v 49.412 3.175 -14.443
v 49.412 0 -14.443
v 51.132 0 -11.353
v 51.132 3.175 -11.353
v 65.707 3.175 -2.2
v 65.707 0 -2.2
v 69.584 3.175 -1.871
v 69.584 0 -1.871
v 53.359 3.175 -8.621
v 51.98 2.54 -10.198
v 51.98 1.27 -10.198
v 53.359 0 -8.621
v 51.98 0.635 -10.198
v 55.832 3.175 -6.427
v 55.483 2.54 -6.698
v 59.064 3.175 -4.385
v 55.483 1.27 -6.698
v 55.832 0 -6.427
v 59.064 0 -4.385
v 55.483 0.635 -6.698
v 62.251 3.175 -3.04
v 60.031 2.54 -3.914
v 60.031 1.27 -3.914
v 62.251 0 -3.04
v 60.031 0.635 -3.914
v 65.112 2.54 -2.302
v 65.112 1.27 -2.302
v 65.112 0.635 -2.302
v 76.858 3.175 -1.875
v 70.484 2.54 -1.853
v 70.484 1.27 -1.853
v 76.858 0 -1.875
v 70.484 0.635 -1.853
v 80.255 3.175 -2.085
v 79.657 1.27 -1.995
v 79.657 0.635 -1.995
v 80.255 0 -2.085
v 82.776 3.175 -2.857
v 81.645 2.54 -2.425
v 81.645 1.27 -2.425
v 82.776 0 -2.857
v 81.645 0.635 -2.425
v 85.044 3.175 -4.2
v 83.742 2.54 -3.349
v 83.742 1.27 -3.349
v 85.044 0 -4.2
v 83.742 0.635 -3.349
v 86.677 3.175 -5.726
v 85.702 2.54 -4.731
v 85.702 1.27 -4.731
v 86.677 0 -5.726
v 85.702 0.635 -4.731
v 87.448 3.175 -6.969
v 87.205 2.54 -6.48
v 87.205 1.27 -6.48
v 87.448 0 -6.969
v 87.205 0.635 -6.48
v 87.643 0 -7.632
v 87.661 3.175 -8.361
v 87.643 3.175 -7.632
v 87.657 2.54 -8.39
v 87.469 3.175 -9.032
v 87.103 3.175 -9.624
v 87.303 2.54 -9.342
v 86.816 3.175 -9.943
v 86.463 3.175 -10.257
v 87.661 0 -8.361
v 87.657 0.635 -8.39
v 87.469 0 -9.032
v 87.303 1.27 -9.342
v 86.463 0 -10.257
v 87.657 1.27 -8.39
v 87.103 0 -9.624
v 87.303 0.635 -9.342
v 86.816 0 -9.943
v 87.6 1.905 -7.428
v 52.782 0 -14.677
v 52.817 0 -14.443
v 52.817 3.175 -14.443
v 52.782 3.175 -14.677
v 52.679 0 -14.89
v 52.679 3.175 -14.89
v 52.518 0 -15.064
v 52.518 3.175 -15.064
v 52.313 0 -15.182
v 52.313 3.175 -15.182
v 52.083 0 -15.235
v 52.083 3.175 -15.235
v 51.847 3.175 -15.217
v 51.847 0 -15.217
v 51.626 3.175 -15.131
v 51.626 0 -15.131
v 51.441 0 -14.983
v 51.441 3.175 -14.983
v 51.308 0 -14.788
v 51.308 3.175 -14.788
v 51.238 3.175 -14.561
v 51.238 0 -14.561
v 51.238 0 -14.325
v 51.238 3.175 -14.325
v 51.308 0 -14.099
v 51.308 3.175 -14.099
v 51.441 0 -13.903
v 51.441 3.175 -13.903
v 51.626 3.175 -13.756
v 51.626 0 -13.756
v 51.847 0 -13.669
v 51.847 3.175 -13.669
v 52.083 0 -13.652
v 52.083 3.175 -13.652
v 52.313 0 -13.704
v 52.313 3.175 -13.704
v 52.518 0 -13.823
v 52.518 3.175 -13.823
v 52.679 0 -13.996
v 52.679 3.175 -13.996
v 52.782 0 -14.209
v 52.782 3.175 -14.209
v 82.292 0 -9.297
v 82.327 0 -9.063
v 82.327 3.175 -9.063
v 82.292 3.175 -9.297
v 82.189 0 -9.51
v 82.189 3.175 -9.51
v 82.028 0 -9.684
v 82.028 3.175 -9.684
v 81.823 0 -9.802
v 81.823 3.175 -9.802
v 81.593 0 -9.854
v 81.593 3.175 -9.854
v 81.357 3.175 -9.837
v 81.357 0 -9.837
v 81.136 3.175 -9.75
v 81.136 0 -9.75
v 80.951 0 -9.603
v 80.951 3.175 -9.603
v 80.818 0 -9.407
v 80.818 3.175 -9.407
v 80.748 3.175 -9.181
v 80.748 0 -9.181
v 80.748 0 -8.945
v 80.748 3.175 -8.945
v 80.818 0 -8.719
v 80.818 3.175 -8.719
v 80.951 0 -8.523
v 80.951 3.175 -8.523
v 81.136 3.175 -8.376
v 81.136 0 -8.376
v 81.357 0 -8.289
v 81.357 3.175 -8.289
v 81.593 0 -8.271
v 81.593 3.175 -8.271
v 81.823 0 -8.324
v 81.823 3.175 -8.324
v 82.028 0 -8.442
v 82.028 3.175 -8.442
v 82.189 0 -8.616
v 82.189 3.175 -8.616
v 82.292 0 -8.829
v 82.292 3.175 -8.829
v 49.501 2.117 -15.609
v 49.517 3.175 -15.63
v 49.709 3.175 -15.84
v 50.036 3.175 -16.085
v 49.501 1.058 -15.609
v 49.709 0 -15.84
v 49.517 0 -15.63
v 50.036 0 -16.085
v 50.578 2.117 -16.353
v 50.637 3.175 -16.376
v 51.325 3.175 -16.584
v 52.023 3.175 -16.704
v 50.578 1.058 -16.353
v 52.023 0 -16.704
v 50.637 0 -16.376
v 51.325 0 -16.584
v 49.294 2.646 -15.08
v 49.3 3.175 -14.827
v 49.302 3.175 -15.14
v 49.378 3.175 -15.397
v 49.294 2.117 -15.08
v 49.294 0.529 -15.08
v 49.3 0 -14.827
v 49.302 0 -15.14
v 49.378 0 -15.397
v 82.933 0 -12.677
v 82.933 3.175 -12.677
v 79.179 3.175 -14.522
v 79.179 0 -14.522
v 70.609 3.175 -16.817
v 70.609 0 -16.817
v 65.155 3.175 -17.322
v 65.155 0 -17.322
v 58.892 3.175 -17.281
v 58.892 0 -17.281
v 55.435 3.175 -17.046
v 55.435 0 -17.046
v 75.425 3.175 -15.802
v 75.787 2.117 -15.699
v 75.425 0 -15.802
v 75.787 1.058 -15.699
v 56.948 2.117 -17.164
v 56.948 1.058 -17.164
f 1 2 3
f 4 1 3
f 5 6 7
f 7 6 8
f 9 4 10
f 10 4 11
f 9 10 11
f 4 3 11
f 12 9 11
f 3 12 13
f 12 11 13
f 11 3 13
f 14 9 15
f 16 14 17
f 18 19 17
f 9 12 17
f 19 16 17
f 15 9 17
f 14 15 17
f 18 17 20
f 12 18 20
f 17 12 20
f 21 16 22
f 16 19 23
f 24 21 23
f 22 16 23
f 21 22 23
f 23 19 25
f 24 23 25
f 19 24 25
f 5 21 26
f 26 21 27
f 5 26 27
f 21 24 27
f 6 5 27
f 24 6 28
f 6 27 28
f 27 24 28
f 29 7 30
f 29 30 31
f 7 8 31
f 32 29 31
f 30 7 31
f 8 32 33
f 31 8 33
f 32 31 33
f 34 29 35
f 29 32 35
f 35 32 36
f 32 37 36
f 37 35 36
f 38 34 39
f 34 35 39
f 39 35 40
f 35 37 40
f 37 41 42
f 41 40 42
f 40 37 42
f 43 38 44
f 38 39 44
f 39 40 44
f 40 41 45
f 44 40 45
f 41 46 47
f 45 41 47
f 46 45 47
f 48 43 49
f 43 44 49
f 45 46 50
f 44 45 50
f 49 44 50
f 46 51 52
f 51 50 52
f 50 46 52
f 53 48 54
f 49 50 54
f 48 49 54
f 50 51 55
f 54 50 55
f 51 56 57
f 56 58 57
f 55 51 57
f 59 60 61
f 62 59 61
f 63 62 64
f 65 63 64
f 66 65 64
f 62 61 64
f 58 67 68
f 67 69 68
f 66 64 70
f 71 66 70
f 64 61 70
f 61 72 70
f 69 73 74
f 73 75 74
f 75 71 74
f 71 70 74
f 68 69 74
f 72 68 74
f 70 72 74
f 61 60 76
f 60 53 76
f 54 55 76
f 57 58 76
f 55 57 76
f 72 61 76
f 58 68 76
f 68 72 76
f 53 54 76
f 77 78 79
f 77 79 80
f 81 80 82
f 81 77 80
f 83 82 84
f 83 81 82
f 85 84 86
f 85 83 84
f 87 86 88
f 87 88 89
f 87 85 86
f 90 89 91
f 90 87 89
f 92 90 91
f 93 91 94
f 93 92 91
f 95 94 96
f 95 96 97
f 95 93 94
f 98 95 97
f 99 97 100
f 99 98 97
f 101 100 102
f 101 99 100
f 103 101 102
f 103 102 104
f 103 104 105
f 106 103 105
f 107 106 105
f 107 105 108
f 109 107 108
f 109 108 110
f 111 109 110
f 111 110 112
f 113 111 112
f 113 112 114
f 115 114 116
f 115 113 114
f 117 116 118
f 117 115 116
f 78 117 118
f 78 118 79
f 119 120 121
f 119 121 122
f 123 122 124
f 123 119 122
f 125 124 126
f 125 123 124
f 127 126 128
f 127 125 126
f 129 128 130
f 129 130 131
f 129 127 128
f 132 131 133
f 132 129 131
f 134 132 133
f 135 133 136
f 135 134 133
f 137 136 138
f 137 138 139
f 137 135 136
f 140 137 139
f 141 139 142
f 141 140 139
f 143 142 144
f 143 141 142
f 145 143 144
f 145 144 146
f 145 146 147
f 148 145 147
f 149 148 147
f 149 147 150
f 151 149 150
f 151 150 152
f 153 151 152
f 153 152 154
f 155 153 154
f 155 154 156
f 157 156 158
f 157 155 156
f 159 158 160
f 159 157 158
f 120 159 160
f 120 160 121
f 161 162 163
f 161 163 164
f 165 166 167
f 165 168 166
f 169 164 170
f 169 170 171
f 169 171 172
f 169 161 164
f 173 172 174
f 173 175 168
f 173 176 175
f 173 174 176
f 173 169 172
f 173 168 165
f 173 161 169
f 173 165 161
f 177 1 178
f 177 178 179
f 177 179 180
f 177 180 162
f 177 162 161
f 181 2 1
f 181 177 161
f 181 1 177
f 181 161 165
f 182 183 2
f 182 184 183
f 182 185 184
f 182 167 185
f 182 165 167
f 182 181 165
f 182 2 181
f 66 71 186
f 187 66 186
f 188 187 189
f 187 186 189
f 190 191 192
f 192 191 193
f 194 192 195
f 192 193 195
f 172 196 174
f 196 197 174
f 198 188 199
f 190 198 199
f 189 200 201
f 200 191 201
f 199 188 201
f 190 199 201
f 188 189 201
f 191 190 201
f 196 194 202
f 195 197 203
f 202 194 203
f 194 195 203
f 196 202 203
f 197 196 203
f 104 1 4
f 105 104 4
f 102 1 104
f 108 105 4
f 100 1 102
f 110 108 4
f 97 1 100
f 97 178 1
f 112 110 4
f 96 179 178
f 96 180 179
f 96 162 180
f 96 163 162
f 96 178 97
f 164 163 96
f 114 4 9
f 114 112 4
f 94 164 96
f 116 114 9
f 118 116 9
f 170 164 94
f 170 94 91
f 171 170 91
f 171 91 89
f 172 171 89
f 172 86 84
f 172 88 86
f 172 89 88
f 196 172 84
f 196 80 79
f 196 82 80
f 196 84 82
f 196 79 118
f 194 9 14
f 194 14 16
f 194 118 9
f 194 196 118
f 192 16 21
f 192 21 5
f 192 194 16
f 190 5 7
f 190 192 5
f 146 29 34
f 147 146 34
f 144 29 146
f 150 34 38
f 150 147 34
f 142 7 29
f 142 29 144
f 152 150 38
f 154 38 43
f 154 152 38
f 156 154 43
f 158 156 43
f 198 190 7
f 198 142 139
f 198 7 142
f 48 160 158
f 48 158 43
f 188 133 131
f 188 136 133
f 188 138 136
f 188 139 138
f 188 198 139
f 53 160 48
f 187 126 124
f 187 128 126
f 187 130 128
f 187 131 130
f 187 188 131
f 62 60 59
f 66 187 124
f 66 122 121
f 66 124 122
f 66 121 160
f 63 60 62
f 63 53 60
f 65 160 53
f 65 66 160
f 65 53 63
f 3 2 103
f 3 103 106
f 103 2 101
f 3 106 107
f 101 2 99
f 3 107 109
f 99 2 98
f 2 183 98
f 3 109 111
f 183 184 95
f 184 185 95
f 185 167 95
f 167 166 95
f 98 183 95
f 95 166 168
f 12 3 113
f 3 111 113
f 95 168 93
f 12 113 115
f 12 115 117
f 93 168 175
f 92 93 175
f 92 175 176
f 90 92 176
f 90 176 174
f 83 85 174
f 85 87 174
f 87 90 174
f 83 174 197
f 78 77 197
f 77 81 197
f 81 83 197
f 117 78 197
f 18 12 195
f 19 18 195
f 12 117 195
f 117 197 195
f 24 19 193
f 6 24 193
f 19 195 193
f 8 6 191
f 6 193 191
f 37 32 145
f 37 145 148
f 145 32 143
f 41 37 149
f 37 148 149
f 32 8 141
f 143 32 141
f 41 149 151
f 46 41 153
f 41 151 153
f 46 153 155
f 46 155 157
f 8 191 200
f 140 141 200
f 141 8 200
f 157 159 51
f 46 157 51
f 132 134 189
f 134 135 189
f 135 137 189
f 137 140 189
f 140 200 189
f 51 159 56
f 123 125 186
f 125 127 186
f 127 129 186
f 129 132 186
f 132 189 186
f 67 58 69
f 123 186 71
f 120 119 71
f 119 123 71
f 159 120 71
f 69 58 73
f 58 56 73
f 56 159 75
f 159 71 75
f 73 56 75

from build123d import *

# Parameters (mm, degrees)
SKETCH1_R           = 0.79375
BOSS_EXTRUDE1_DEPTH = 3.175


with BuildPart() as part:
    # Sketch1 → Boss-Extrude1 (new body)
    with BuildSketch(Plane(origin=(0, 0, 0), x_dir=(1, 0, 0), z_dir=(0, 1, 0))):
        with BuildLine():
            add(Edge.make_bspline(
                [(49.412189484, 14.443157545), (50.761648696, 11.392855179), (55.172987066, 5.915157755), (64.97864162, 1.398978829), (75.147185312, 2.089733415), (83.105841305, 1.55391046), (89.416410621, 7.888590669), (86.463066332, 10.256559663)],
                knots=[0, 0, 0, 0, 0.211071899, 0.438109061, 0.667266743, 0.84075123, 1, 1, 1, 1], degree=3))
            add(Edge.make_bspline(
                [(86.463066332, 10.256559663), (83.212986527, 12.862448937), (73.898782123, 17.329617093), (61.577330311, 17.655900513), (53.645408959, 16.888370063), (52.023242095, 16.703785699)],
                knots=[0, 0, 0, 0, 0.334481553, 0.861935931, 1, 1, 1, 1], degree=3))
            add(Edge.make_bspline(
                [(49.412189484, 14.443157545), (48.799547338, 15.827966933), (50.600615633, 16.541906791), (52.023242095, 16.703785699)],
                knots=[0, 0, 0, 0, 1, 1, 1, 1], degree=3))
        make_face()
        with Locations((52.023242095, 14.443157545)):
            Circle(SKETCH1_R, mode=Mode.SUBTRACT)
        with Locations((81.533232746, 9.062953732)):
            Circle(SKETCH1_R, mode=Mode.SUBTRACT)
    extrude(amount=BOSS_EXTRUDE1_DEPTH)


solid = part.part
